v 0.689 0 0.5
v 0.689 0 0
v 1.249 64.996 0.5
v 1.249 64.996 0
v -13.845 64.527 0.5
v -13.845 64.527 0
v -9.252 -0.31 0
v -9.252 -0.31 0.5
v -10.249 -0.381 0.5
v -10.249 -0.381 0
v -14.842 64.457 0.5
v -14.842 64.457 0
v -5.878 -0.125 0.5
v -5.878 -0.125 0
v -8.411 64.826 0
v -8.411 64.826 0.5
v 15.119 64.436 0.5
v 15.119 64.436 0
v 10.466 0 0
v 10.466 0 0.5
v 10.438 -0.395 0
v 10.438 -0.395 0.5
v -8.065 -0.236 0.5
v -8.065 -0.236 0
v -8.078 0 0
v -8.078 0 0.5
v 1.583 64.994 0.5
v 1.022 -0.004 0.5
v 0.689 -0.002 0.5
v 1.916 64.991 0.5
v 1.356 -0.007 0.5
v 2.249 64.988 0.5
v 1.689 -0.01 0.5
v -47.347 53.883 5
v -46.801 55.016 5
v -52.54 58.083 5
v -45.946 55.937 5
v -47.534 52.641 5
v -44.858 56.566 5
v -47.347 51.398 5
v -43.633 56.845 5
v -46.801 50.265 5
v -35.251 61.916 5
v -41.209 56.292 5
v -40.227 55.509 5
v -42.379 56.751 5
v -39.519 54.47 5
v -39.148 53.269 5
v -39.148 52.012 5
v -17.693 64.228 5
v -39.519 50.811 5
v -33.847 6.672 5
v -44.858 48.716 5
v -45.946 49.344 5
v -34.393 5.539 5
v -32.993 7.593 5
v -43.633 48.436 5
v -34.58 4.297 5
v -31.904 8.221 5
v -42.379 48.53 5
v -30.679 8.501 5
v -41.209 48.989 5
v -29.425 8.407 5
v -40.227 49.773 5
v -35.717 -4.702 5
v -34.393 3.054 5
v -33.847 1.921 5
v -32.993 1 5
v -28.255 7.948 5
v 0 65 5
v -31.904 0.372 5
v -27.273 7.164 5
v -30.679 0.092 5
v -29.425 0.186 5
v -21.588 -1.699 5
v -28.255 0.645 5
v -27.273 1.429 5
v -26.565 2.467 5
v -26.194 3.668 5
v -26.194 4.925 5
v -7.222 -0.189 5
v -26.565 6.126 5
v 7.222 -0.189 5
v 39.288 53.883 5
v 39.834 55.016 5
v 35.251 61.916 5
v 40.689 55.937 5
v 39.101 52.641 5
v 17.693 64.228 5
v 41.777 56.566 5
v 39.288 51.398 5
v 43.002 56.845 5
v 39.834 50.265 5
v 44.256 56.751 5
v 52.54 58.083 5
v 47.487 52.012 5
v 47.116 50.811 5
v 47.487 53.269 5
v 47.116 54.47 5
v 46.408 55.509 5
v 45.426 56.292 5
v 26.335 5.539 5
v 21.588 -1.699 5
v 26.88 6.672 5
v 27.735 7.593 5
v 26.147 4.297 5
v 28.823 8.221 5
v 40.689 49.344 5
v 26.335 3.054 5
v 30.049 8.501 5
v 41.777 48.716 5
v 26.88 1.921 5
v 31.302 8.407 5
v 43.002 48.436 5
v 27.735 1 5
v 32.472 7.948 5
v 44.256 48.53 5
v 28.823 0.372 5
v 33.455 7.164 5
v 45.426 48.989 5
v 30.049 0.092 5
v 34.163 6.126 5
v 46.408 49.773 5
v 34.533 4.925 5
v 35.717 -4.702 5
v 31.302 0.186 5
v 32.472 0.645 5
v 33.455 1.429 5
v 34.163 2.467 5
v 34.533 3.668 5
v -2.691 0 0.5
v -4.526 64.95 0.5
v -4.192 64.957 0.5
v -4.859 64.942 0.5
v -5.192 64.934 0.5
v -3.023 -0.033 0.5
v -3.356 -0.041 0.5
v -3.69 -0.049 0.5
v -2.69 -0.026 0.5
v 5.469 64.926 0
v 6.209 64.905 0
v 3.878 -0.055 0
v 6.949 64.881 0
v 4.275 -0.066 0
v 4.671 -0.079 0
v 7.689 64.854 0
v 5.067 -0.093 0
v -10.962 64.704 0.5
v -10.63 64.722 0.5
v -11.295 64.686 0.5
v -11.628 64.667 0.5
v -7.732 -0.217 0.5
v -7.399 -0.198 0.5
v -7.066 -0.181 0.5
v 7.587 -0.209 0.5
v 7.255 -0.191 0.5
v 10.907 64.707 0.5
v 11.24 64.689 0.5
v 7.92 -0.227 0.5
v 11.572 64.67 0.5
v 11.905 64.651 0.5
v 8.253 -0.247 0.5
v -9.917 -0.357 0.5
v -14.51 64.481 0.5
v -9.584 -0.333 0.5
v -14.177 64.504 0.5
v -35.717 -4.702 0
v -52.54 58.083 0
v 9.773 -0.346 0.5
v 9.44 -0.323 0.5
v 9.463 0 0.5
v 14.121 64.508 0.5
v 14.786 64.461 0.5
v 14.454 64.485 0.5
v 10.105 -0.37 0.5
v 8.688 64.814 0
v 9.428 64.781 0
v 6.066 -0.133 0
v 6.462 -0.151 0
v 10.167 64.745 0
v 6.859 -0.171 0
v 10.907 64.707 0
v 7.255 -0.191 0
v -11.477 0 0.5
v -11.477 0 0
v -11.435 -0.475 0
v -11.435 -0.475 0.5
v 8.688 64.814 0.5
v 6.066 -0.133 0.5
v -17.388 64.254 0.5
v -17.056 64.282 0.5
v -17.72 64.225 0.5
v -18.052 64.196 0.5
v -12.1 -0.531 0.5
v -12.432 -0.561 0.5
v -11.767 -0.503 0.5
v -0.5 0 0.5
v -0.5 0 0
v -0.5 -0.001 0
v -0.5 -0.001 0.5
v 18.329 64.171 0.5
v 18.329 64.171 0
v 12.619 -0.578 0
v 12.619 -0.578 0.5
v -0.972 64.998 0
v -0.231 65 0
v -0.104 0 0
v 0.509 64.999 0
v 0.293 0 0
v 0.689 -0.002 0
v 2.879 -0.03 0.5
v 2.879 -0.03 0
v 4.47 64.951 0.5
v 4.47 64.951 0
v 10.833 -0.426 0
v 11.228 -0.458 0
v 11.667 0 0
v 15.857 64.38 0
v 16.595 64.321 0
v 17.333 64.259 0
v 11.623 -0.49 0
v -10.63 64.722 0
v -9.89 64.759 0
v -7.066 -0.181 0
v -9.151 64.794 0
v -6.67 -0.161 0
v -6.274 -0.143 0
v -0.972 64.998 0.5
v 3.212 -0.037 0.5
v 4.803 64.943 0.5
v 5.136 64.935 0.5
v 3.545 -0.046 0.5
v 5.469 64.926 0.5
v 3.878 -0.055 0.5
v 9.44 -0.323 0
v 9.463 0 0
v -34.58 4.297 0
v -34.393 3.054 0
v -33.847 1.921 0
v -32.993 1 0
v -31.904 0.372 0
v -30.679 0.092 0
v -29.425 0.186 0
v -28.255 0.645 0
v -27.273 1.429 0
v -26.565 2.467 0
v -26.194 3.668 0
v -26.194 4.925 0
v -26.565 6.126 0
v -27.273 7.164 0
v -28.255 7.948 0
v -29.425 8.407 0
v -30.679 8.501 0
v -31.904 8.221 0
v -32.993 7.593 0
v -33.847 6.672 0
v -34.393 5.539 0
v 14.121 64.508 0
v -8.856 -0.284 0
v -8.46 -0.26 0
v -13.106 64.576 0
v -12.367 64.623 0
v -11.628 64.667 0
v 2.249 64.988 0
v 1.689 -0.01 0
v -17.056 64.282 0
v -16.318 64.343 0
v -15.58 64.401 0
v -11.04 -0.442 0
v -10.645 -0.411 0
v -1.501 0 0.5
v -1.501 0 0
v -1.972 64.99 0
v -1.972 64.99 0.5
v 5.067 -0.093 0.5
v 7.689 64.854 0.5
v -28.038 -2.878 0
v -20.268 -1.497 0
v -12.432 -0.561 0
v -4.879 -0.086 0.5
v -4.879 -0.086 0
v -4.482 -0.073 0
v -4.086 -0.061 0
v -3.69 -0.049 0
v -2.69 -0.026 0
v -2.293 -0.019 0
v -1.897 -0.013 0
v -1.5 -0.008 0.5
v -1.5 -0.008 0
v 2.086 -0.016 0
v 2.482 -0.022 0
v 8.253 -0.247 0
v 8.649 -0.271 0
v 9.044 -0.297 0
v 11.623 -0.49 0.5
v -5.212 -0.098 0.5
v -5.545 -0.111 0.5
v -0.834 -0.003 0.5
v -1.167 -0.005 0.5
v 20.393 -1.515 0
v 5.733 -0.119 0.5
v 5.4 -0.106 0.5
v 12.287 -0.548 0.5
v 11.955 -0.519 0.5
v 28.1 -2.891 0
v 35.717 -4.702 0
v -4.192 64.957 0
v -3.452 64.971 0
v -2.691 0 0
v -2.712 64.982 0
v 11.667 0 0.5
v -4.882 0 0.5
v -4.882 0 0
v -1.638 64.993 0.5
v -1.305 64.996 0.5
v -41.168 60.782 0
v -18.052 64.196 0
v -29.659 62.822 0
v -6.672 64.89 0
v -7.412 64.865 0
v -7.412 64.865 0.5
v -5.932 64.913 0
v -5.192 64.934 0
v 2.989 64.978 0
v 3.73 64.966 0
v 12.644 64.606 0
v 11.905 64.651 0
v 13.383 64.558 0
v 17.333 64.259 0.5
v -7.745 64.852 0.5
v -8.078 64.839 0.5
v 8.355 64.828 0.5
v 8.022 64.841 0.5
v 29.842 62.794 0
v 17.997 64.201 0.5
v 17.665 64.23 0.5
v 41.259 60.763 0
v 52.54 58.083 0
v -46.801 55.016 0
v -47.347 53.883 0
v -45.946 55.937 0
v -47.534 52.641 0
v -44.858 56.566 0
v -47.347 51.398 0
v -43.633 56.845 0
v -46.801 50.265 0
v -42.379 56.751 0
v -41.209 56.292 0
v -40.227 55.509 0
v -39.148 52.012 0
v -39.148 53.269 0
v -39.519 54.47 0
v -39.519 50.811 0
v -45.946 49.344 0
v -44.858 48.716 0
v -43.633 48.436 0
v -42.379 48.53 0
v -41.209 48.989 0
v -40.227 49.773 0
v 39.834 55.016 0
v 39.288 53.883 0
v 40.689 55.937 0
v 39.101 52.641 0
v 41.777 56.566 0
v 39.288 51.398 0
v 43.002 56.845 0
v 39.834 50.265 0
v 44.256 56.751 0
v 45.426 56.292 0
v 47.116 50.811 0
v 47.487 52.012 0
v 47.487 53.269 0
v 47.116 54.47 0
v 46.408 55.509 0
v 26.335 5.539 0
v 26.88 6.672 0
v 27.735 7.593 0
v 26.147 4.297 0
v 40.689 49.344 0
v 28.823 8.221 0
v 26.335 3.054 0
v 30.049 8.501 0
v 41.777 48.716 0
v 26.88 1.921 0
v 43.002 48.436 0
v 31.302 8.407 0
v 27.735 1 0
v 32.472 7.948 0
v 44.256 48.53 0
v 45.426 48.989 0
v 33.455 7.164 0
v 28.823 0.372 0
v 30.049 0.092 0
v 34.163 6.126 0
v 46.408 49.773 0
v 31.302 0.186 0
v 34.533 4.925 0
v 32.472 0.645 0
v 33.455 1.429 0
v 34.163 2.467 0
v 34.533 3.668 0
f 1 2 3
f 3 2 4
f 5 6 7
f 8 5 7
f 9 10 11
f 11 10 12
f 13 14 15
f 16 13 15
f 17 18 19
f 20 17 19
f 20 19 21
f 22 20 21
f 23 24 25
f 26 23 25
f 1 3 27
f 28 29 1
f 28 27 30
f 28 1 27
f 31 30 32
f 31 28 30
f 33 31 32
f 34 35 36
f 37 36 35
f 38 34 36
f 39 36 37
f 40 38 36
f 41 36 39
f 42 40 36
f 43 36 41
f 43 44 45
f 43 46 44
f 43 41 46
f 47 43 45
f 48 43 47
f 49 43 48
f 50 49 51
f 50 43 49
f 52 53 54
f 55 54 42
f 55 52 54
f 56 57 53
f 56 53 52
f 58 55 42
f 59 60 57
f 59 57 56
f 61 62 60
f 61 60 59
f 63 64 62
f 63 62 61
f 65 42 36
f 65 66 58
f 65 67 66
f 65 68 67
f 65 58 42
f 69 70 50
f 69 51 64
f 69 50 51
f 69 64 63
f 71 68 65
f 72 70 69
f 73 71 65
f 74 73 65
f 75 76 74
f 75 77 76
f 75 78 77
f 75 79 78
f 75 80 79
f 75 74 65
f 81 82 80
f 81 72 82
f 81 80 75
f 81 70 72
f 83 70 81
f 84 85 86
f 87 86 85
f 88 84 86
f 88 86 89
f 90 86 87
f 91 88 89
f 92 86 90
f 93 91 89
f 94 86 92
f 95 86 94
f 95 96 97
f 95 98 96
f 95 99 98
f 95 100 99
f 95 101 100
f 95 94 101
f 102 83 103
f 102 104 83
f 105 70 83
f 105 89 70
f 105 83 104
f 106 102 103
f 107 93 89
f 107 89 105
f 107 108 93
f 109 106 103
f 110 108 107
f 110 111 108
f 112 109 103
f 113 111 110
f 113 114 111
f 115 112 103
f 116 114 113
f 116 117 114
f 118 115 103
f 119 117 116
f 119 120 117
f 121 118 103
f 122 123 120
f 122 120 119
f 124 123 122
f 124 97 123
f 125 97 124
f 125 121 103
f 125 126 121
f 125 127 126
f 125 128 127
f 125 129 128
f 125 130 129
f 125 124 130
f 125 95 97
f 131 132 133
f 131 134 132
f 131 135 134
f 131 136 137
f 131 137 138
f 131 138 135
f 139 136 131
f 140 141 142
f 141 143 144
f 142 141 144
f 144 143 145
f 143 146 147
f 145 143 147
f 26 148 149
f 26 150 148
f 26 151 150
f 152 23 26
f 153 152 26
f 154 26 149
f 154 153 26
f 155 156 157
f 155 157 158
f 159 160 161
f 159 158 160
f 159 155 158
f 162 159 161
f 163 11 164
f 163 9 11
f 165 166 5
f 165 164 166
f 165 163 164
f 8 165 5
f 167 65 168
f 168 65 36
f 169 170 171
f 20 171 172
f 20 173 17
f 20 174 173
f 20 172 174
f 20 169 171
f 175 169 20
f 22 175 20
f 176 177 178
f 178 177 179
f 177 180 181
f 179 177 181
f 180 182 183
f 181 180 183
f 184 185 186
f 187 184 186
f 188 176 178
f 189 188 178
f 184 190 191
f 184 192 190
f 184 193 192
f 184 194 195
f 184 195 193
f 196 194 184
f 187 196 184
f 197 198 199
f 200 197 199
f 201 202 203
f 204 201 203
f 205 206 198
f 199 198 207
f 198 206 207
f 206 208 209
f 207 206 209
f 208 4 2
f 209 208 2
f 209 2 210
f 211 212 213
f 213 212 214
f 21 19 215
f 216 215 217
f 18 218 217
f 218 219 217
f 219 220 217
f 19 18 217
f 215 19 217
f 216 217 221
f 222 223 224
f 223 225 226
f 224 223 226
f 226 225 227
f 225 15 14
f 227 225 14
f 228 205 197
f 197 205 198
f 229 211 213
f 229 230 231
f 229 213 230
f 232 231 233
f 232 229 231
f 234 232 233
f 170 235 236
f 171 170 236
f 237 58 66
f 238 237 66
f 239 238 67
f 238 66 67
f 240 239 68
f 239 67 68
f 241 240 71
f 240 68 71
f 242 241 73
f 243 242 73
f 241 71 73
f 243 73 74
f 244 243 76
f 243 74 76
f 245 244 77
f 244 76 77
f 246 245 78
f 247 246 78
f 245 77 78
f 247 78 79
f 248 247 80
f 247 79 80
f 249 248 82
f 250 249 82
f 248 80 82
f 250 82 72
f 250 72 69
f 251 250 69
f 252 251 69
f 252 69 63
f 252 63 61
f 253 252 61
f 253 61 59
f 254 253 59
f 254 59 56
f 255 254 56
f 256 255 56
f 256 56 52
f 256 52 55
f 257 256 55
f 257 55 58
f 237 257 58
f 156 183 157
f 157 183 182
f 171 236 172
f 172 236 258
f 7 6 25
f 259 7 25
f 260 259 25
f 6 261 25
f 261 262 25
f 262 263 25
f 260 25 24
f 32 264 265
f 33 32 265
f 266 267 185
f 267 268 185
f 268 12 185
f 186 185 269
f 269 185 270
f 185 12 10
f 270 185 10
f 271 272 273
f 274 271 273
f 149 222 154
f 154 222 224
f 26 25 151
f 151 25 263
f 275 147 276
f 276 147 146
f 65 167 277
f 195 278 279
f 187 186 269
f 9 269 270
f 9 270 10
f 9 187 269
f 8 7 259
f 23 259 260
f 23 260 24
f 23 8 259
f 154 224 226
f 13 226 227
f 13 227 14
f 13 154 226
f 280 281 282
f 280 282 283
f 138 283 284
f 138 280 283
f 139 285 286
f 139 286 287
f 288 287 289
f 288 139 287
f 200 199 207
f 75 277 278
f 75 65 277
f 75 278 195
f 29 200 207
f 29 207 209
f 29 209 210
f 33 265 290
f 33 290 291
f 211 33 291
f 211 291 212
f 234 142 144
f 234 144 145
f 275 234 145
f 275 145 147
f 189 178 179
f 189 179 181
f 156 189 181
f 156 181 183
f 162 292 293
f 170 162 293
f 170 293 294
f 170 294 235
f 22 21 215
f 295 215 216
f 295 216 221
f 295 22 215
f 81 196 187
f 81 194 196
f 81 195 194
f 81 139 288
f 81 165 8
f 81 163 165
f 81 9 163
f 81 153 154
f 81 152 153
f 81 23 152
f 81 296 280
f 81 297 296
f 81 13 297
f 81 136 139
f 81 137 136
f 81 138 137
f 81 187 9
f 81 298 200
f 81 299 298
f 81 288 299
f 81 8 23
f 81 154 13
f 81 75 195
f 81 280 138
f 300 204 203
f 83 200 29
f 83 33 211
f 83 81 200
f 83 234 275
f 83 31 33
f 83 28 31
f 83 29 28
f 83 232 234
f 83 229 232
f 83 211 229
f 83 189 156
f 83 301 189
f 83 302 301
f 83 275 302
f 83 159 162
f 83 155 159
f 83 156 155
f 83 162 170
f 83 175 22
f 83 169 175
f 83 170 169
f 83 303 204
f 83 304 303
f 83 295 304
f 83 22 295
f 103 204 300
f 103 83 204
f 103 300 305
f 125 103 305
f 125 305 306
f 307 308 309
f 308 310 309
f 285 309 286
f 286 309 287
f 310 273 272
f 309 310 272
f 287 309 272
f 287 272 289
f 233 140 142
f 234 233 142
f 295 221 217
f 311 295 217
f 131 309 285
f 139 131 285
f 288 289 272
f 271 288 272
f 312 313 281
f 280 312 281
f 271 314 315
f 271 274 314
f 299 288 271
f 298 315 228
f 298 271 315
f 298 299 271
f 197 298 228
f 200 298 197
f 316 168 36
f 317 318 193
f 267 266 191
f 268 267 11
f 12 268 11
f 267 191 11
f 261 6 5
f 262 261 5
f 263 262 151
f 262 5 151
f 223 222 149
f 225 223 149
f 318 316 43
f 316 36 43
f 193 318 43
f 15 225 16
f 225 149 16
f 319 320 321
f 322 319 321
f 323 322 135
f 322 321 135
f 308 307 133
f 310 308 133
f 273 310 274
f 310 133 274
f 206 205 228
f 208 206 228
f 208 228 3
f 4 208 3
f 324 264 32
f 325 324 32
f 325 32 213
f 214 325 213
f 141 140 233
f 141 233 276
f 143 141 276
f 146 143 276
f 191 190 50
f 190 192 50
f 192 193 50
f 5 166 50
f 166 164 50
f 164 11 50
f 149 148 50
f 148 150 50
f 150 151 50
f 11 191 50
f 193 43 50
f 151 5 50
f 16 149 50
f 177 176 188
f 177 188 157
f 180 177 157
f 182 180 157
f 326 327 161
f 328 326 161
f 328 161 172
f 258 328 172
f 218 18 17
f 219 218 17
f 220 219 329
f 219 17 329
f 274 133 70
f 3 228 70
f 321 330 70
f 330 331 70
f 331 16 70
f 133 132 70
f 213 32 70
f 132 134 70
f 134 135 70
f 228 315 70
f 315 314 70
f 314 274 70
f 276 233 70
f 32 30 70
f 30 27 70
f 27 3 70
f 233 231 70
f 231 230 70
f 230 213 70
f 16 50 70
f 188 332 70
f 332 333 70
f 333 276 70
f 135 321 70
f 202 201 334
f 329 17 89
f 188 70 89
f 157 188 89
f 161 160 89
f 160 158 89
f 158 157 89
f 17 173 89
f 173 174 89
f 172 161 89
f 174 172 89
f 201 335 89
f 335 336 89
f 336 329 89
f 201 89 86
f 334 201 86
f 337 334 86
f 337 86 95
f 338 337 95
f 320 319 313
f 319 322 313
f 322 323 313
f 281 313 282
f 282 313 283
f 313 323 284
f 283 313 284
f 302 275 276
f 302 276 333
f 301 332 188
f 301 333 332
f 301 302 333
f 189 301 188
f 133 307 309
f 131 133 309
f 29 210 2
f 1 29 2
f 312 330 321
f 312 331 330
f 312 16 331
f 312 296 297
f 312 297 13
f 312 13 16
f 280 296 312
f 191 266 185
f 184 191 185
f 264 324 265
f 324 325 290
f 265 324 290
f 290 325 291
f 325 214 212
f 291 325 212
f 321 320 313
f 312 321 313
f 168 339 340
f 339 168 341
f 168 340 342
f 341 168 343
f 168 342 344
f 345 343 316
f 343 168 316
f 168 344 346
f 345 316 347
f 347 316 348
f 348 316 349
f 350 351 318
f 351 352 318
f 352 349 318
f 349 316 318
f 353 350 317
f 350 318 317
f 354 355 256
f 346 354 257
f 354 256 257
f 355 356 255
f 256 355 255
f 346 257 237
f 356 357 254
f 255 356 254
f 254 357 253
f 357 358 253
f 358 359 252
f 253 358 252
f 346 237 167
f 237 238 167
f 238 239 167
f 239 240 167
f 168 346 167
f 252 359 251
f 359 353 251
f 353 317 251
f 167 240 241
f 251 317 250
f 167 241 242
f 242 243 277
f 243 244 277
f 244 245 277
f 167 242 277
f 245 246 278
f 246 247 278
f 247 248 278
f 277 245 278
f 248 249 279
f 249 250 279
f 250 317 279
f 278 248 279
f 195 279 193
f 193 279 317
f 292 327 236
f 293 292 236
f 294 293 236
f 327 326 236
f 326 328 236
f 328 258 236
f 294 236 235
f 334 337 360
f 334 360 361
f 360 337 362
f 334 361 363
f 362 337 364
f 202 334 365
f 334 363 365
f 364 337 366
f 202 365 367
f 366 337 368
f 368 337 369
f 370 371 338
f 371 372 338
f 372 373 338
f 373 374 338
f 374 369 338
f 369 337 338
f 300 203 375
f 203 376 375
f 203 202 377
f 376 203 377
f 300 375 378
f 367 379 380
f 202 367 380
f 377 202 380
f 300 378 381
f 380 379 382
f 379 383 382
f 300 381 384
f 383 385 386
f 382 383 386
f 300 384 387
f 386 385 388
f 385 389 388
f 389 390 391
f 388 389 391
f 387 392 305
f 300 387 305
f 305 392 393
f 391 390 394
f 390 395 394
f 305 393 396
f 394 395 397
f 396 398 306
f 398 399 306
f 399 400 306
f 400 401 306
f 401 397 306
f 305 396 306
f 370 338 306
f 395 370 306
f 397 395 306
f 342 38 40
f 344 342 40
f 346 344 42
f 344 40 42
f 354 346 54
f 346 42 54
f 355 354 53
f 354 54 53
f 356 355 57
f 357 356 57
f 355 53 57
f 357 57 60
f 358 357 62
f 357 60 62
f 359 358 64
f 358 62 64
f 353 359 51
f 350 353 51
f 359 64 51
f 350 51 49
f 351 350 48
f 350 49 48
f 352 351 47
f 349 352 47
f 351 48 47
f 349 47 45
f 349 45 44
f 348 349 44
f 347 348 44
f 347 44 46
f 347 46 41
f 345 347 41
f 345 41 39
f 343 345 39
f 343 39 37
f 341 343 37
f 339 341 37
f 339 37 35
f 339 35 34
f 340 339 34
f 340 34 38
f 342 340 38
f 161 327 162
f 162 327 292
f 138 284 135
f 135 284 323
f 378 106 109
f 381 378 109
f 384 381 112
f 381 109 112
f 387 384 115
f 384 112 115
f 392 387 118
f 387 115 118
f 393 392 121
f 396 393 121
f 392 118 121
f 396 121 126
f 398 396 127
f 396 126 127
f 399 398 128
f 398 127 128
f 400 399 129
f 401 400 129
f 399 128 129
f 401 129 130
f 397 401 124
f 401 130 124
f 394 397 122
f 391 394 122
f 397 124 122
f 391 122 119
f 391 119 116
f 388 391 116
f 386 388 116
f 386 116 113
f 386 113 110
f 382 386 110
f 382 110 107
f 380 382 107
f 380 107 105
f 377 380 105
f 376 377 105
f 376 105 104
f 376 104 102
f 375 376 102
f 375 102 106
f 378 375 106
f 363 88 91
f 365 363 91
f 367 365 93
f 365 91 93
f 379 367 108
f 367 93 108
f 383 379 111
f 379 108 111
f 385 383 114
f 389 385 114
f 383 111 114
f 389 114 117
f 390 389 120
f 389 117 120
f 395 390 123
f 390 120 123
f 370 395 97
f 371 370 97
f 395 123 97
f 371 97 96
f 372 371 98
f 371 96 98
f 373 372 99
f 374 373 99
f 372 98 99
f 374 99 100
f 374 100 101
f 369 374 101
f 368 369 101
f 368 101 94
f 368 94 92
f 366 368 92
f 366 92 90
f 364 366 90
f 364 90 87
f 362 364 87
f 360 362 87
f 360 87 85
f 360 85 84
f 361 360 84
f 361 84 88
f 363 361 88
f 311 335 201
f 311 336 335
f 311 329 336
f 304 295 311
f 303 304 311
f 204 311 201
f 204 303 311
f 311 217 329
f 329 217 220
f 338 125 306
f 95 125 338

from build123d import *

# Parameters (mm, degrees)
F0_W          = 65
F0_H          = 5
F1_ANGLE_BACK = 15
F1_ANGLE      = 30
F3_DEPTH      = 0.5
F5_D          = 8.4328


with BuildPart() as f1:
    # F0 (on Right) → F1 (revolve)
    with BuildSketch(Plane.YZ, mode=Mode.PRIVATE) as f1_sk:
        with Locations((32.5, 2.5)):
            Rectangle(F0_W, F0_H)
    revolve(f1_sk.sketch.rotate(Axis((0, -138, 18.1028265506), (0, 0, -1)), -F1_ANGLE_BACK), axis=Axis((0, -138, 18.1028265506), (0, 0, -1)), revolution_arc=F1_ANGLE)

    # F2 (on face) → F3 (cut)
    with BuildSketch(Plane(origin=(0, 0, 0), x_dir=(1, 0, 0), z_dir=(0, 0, -1))):
        Polygon((-17.7241188623, -71.9769457125), (-11.4765199745, 3e-10), (-11.9784, 3e-10), (-5.7345541206, 71.9337082881), (-6.2326811376, 71.9769457131), (-18.7203728964, -71.8904708623), align=None)
        Polygon((-11.9784, 3e-10), (-11.4765199745, 3e-10), (-5.2364271036, 71.890470863), (-5.7345541206, 71.9337082881), align=None)
        Polygon((-14.3904012595, -72.2317256548), (-9.2739048409, 3e-10), (-10.2764104633, 3e-10), (-15.3879018995, -72.1610682199), align=None)
        Polygon((-10.2764104633, 3e-10), (-9.2739048409, 3e-10), (-4.1868765839, 71.8157112602), (-5.184377224, 71.886368695), align=None)
        Polygon((-11.05306095, -72.4335808844), (-7.0761095593, 3e-10), (-8.0776156937, 3e-10), (-12.0515570806, -72.3787586524), align=None)
        Polygon((-8.0776156937, 3e-10), (-7.0761095593, 3e-10), (-3.1362720404, 71.7576131981), (-4.1347681711, 71.8124354301), align=None)
        Polygon((-7.7129380916, -72.5824605854), (-4.8820145346, 3e-10), (-5.8827748571, 3e-10), (-8.7121783467, -72.5434873575), align=None)
        Polygon((-5.8827748571, 3e-10), (-4.8820145346, 3e-10), (-2.0848779572, 71.7161913026), (-3.0841182124, 71.7551645305), align=None)
        Polygon((-4.3708735422, -72.678327278), (-2.6905077568, 3e-10), (-3.6907750019, 3e-10), (-5.3706063685, -72.6552128656), align=None)
        Polygon((-3.6907750019, 3e-10), (-2.6905077568, 3e-10), (-1.0329590172, 71.6914560015), (-2.0326918435, 71.714570414), align=None)
        Polygon((-1.0277086488, -72.7211568285), (-0.5004825388, 3e-10), (-1.5005088195, 3e-10), (-2.0276823688, -72.7139070503), align=None)
        Polygon((-1.5005088195, 3e-10), (-0.5004825388, 3e-10), (0.0192199648, 71.6834135218), (-0.9807537552, 71.6906633), align=None)
        Polygon((5.3267903546, 71.8976905392), (11.6665424492, 3e-10), (18.0111294073, -71.9525216273), (19.0072643041, -71.8646850327), (6.3229252514, 71.9855271339), align=None)
        Polygon((4.2773430078, 71.8214963276), (9.4634593874, 3e-10), (10.4660630255, 3e-10), (5.274746131, 71.8935172258), align=None)
        Polygon((10.4660630255, 3e-10), (9.4634593874, 3e-10), (14.6777631894, -72.2118583428), (15.6751663126, -72.1398374447), align=None)
        Polygon((3.2268188627, 71.7619622003), (7.2652930626, 3e-10), (8.2668753034, 3e-10), (4.2252391215, 71.8181492712), align=None)
        Polygon((8.2668753034, 3e-10), (7.2652930626, 3e-10), (11.3407019231, -72.4182753472), (12.3391221818, -72.3620882763), align=None)
        Polygon((2.1754823833, 71.7191031448), (5.0709231192, 3e-10), (6.071737735, 3e-10), (3.1746684306, 71.7594422436), align=None)
        Polygon((6.071737735, 3e-10), (5.0709231192, 3e-10), (8.0007856957, -72.571720676), (8.999971743, -72.5313815772), align=None)
        Polygon((1.1235982379, 71.6929299507), (2.8792369834, 3e-10), (3.8795367771, 3e-10), (2.123298534, 71.7174109221), align=None)
        Polygon((3.8795367771, 3e-10), (2.8792369834, 3e-10), (4.6588553133, -72.6721557002), (5.6585556094, -72.6476747287), align=None)
        Polygon((0.0714312325, 71.6834492068), (0.6891275978, 3e-10), (1.6891647234, 3e-10), (1.0713941082, 71.6920658881), align=None)
        Polygon((1.6891647234, 3e-10), (0.6891275978, 3e-10), (1.315752089, -72.7195551358), (2.3157149647, -72.7109384546), align=None)
    extrude(amount=-F3_DEPTH, mode=Mode.SUBTRACT)

    # F5 (through all)
    with Locations(Plane(origin=(0, 0, 0), x_dir=(1, 0, 0), z_dir=(0, 0, -1))):
        with Locations((-30.363664634, -4.2965139067), (30.363664634, -4.2965139067), (43.3174317129, -52.6406307947), (-43.3174317129, -52.6406307947)):
            Hole(F5_D / 2)


solid = f1.part
